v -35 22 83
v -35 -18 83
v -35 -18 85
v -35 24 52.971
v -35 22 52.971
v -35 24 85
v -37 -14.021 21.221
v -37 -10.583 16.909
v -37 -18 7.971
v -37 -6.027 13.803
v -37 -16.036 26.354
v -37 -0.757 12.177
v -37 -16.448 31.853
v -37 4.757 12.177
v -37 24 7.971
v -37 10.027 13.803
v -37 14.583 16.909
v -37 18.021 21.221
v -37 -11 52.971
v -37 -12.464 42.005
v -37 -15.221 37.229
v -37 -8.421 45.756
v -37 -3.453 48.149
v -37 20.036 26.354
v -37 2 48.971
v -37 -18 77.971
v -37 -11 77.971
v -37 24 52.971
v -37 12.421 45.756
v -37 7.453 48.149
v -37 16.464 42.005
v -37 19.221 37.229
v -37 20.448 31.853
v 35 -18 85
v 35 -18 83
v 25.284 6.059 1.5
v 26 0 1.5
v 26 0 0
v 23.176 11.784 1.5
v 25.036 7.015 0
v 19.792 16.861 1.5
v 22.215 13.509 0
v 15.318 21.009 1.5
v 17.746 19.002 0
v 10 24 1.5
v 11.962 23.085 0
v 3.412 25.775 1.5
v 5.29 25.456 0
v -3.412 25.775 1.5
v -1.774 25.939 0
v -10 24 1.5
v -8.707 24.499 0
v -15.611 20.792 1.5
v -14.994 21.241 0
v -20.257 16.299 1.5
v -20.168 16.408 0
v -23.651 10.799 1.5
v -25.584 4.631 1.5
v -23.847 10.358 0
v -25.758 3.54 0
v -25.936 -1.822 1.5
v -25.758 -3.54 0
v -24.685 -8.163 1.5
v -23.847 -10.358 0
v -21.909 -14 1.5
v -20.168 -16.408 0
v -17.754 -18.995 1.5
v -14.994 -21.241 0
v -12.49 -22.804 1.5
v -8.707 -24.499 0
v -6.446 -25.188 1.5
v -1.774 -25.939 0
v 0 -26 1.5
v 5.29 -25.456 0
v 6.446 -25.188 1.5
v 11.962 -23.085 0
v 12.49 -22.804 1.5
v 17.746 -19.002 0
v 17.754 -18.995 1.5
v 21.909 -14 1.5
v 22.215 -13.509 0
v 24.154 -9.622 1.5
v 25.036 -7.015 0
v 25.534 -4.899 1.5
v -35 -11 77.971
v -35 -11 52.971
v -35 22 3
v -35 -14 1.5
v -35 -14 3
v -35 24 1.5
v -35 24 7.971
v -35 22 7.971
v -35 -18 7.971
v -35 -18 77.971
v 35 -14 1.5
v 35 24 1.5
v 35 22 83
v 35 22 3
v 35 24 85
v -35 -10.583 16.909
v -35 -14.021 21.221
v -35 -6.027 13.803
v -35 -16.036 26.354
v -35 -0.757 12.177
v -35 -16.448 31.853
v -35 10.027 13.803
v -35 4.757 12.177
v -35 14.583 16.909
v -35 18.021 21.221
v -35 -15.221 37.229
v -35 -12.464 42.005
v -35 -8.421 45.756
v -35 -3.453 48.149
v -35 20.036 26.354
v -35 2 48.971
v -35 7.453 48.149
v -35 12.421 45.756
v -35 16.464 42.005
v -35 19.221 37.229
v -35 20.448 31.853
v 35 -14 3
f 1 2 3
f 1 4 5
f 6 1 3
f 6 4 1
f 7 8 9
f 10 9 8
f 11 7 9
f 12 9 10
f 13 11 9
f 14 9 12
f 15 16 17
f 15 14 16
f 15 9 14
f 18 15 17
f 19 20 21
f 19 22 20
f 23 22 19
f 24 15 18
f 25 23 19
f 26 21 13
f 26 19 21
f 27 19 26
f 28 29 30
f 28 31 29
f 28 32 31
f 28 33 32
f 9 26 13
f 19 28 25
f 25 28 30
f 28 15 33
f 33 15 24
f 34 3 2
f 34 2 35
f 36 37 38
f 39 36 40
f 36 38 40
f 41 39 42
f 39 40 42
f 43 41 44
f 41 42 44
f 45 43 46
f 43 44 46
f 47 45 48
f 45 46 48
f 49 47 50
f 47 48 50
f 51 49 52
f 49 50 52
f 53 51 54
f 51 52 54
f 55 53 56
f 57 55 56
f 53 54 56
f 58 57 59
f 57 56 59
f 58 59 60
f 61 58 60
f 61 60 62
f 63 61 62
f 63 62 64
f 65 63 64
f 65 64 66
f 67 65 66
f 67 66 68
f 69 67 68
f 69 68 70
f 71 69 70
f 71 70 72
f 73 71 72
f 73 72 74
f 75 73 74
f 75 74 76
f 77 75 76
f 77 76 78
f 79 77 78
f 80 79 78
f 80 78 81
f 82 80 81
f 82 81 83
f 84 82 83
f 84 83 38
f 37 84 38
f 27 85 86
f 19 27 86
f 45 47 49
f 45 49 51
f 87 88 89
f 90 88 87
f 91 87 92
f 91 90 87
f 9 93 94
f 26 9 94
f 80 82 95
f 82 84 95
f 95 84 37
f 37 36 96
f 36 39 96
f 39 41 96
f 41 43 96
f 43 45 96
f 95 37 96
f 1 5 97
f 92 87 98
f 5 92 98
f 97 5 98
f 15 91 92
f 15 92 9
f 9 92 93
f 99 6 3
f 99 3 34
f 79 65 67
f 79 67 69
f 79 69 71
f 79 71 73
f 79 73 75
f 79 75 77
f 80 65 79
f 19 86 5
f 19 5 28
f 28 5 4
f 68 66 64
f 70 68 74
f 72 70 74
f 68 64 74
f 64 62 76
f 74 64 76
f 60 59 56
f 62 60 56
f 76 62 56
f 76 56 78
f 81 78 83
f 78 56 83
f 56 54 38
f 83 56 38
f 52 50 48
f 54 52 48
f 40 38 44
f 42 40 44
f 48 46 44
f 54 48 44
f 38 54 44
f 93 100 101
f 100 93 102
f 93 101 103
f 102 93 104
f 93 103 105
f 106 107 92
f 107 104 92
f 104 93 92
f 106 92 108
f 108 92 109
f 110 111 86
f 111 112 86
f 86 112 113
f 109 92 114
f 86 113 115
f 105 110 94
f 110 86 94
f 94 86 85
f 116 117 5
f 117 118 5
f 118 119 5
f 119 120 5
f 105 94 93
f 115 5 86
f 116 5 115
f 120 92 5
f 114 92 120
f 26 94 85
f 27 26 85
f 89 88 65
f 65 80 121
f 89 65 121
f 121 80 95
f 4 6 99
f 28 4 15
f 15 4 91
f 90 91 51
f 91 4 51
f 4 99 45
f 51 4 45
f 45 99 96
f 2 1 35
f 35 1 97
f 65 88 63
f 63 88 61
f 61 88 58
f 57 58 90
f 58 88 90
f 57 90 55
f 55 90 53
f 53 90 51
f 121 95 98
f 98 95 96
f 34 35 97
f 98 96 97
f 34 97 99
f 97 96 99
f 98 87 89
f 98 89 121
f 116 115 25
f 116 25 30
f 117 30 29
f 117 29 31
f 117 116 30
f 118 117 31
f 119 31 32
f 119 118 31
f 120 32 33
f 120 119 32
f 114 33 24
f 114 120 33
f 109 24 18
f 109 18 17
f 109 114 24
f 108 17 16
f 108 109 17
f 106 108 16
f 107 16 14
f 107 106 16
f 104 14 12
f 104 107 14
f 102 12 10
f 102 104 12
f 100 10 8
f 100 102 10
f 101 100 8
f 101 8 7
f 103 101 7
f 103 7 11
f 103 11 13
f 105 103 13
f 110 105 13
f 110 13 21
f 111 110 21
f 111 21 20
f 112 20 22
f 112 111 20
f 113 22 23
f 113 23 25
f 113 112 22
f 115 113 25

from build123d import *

# Parameters (mm, degrees)
SKETCH_1_R      = 26
EXTRUDE_1_DEPTH = 1.5
EXTRUDE_2_DEPTH = 1.5
SKETCH_3_W      = 70
SKETCH_3_H      = 2
EXTRUDE_3_DEPTH = 82
SKETCH_4_W      = 70
SKETCH_4_H      = 2
EXTRUDE_4_DEPTH = 40
SKETCH_5_R      = 18.5
EXTRUDE_5_DEPTH = 2


with BuildPart() as part:
    # 草图1 → 凸台-拉伸1 (new body)
    with BuildSketch(Plane.XY):
        Circle(SKETCH_1_R)
    extrude(amount=EXTRUDE_1_DEPTH)

    # 草图2 → 凸台-拉伸2 (add)
    with BuildSketch(Plane.XY.offset(1.5)):
        Polygon((-35, 24), (-35, -14), (-21.9089023, -14), (21.9089023, -14), (35, -14), (35, 24), align=None)
    extrude(amount=EXTRUDE_2_DEPTH)

    # 草图3 → 凸台-拉伸3 (add)
    with BuildSketch(Plane.XY.offset(3)):
        with Locations((0, 23)):
            Rectangle(SKETCH_3_W, SKETCH_3_H)
    extrude(amount=EXTRUDE_3_DEPTH)

    # 草图4 → 凸台-拉伸4 (add)
    with BuildSketch(Plane.XZ.offset(-22)):
        with Locations((0, 84)):
            Rectangle(SKETCH_4_W, SKETCH_4_H)
    extrude(amount=EXTRUDE_4_DEPTH)

    # 草图5 → 凸台-拉伸5 (add)
    with BuildSketch(Plane.ZY.offset(35)):
        Polygon((7.970689751, -18), (77.970689751, -18), (77.970689751, -11), (52.970689751, -11), (52.970689751, 22), (52.970689751, 24), (7.970689751, 24), (7.970689751, 22), align=None)
        with Locations((30.470689751, 2)):
            Circle(SKETCH_5_R, mode=Mode.SUBTRACT)
    extrude(amount=EXTRUDE_5_DEPTH)


solid = part.part
